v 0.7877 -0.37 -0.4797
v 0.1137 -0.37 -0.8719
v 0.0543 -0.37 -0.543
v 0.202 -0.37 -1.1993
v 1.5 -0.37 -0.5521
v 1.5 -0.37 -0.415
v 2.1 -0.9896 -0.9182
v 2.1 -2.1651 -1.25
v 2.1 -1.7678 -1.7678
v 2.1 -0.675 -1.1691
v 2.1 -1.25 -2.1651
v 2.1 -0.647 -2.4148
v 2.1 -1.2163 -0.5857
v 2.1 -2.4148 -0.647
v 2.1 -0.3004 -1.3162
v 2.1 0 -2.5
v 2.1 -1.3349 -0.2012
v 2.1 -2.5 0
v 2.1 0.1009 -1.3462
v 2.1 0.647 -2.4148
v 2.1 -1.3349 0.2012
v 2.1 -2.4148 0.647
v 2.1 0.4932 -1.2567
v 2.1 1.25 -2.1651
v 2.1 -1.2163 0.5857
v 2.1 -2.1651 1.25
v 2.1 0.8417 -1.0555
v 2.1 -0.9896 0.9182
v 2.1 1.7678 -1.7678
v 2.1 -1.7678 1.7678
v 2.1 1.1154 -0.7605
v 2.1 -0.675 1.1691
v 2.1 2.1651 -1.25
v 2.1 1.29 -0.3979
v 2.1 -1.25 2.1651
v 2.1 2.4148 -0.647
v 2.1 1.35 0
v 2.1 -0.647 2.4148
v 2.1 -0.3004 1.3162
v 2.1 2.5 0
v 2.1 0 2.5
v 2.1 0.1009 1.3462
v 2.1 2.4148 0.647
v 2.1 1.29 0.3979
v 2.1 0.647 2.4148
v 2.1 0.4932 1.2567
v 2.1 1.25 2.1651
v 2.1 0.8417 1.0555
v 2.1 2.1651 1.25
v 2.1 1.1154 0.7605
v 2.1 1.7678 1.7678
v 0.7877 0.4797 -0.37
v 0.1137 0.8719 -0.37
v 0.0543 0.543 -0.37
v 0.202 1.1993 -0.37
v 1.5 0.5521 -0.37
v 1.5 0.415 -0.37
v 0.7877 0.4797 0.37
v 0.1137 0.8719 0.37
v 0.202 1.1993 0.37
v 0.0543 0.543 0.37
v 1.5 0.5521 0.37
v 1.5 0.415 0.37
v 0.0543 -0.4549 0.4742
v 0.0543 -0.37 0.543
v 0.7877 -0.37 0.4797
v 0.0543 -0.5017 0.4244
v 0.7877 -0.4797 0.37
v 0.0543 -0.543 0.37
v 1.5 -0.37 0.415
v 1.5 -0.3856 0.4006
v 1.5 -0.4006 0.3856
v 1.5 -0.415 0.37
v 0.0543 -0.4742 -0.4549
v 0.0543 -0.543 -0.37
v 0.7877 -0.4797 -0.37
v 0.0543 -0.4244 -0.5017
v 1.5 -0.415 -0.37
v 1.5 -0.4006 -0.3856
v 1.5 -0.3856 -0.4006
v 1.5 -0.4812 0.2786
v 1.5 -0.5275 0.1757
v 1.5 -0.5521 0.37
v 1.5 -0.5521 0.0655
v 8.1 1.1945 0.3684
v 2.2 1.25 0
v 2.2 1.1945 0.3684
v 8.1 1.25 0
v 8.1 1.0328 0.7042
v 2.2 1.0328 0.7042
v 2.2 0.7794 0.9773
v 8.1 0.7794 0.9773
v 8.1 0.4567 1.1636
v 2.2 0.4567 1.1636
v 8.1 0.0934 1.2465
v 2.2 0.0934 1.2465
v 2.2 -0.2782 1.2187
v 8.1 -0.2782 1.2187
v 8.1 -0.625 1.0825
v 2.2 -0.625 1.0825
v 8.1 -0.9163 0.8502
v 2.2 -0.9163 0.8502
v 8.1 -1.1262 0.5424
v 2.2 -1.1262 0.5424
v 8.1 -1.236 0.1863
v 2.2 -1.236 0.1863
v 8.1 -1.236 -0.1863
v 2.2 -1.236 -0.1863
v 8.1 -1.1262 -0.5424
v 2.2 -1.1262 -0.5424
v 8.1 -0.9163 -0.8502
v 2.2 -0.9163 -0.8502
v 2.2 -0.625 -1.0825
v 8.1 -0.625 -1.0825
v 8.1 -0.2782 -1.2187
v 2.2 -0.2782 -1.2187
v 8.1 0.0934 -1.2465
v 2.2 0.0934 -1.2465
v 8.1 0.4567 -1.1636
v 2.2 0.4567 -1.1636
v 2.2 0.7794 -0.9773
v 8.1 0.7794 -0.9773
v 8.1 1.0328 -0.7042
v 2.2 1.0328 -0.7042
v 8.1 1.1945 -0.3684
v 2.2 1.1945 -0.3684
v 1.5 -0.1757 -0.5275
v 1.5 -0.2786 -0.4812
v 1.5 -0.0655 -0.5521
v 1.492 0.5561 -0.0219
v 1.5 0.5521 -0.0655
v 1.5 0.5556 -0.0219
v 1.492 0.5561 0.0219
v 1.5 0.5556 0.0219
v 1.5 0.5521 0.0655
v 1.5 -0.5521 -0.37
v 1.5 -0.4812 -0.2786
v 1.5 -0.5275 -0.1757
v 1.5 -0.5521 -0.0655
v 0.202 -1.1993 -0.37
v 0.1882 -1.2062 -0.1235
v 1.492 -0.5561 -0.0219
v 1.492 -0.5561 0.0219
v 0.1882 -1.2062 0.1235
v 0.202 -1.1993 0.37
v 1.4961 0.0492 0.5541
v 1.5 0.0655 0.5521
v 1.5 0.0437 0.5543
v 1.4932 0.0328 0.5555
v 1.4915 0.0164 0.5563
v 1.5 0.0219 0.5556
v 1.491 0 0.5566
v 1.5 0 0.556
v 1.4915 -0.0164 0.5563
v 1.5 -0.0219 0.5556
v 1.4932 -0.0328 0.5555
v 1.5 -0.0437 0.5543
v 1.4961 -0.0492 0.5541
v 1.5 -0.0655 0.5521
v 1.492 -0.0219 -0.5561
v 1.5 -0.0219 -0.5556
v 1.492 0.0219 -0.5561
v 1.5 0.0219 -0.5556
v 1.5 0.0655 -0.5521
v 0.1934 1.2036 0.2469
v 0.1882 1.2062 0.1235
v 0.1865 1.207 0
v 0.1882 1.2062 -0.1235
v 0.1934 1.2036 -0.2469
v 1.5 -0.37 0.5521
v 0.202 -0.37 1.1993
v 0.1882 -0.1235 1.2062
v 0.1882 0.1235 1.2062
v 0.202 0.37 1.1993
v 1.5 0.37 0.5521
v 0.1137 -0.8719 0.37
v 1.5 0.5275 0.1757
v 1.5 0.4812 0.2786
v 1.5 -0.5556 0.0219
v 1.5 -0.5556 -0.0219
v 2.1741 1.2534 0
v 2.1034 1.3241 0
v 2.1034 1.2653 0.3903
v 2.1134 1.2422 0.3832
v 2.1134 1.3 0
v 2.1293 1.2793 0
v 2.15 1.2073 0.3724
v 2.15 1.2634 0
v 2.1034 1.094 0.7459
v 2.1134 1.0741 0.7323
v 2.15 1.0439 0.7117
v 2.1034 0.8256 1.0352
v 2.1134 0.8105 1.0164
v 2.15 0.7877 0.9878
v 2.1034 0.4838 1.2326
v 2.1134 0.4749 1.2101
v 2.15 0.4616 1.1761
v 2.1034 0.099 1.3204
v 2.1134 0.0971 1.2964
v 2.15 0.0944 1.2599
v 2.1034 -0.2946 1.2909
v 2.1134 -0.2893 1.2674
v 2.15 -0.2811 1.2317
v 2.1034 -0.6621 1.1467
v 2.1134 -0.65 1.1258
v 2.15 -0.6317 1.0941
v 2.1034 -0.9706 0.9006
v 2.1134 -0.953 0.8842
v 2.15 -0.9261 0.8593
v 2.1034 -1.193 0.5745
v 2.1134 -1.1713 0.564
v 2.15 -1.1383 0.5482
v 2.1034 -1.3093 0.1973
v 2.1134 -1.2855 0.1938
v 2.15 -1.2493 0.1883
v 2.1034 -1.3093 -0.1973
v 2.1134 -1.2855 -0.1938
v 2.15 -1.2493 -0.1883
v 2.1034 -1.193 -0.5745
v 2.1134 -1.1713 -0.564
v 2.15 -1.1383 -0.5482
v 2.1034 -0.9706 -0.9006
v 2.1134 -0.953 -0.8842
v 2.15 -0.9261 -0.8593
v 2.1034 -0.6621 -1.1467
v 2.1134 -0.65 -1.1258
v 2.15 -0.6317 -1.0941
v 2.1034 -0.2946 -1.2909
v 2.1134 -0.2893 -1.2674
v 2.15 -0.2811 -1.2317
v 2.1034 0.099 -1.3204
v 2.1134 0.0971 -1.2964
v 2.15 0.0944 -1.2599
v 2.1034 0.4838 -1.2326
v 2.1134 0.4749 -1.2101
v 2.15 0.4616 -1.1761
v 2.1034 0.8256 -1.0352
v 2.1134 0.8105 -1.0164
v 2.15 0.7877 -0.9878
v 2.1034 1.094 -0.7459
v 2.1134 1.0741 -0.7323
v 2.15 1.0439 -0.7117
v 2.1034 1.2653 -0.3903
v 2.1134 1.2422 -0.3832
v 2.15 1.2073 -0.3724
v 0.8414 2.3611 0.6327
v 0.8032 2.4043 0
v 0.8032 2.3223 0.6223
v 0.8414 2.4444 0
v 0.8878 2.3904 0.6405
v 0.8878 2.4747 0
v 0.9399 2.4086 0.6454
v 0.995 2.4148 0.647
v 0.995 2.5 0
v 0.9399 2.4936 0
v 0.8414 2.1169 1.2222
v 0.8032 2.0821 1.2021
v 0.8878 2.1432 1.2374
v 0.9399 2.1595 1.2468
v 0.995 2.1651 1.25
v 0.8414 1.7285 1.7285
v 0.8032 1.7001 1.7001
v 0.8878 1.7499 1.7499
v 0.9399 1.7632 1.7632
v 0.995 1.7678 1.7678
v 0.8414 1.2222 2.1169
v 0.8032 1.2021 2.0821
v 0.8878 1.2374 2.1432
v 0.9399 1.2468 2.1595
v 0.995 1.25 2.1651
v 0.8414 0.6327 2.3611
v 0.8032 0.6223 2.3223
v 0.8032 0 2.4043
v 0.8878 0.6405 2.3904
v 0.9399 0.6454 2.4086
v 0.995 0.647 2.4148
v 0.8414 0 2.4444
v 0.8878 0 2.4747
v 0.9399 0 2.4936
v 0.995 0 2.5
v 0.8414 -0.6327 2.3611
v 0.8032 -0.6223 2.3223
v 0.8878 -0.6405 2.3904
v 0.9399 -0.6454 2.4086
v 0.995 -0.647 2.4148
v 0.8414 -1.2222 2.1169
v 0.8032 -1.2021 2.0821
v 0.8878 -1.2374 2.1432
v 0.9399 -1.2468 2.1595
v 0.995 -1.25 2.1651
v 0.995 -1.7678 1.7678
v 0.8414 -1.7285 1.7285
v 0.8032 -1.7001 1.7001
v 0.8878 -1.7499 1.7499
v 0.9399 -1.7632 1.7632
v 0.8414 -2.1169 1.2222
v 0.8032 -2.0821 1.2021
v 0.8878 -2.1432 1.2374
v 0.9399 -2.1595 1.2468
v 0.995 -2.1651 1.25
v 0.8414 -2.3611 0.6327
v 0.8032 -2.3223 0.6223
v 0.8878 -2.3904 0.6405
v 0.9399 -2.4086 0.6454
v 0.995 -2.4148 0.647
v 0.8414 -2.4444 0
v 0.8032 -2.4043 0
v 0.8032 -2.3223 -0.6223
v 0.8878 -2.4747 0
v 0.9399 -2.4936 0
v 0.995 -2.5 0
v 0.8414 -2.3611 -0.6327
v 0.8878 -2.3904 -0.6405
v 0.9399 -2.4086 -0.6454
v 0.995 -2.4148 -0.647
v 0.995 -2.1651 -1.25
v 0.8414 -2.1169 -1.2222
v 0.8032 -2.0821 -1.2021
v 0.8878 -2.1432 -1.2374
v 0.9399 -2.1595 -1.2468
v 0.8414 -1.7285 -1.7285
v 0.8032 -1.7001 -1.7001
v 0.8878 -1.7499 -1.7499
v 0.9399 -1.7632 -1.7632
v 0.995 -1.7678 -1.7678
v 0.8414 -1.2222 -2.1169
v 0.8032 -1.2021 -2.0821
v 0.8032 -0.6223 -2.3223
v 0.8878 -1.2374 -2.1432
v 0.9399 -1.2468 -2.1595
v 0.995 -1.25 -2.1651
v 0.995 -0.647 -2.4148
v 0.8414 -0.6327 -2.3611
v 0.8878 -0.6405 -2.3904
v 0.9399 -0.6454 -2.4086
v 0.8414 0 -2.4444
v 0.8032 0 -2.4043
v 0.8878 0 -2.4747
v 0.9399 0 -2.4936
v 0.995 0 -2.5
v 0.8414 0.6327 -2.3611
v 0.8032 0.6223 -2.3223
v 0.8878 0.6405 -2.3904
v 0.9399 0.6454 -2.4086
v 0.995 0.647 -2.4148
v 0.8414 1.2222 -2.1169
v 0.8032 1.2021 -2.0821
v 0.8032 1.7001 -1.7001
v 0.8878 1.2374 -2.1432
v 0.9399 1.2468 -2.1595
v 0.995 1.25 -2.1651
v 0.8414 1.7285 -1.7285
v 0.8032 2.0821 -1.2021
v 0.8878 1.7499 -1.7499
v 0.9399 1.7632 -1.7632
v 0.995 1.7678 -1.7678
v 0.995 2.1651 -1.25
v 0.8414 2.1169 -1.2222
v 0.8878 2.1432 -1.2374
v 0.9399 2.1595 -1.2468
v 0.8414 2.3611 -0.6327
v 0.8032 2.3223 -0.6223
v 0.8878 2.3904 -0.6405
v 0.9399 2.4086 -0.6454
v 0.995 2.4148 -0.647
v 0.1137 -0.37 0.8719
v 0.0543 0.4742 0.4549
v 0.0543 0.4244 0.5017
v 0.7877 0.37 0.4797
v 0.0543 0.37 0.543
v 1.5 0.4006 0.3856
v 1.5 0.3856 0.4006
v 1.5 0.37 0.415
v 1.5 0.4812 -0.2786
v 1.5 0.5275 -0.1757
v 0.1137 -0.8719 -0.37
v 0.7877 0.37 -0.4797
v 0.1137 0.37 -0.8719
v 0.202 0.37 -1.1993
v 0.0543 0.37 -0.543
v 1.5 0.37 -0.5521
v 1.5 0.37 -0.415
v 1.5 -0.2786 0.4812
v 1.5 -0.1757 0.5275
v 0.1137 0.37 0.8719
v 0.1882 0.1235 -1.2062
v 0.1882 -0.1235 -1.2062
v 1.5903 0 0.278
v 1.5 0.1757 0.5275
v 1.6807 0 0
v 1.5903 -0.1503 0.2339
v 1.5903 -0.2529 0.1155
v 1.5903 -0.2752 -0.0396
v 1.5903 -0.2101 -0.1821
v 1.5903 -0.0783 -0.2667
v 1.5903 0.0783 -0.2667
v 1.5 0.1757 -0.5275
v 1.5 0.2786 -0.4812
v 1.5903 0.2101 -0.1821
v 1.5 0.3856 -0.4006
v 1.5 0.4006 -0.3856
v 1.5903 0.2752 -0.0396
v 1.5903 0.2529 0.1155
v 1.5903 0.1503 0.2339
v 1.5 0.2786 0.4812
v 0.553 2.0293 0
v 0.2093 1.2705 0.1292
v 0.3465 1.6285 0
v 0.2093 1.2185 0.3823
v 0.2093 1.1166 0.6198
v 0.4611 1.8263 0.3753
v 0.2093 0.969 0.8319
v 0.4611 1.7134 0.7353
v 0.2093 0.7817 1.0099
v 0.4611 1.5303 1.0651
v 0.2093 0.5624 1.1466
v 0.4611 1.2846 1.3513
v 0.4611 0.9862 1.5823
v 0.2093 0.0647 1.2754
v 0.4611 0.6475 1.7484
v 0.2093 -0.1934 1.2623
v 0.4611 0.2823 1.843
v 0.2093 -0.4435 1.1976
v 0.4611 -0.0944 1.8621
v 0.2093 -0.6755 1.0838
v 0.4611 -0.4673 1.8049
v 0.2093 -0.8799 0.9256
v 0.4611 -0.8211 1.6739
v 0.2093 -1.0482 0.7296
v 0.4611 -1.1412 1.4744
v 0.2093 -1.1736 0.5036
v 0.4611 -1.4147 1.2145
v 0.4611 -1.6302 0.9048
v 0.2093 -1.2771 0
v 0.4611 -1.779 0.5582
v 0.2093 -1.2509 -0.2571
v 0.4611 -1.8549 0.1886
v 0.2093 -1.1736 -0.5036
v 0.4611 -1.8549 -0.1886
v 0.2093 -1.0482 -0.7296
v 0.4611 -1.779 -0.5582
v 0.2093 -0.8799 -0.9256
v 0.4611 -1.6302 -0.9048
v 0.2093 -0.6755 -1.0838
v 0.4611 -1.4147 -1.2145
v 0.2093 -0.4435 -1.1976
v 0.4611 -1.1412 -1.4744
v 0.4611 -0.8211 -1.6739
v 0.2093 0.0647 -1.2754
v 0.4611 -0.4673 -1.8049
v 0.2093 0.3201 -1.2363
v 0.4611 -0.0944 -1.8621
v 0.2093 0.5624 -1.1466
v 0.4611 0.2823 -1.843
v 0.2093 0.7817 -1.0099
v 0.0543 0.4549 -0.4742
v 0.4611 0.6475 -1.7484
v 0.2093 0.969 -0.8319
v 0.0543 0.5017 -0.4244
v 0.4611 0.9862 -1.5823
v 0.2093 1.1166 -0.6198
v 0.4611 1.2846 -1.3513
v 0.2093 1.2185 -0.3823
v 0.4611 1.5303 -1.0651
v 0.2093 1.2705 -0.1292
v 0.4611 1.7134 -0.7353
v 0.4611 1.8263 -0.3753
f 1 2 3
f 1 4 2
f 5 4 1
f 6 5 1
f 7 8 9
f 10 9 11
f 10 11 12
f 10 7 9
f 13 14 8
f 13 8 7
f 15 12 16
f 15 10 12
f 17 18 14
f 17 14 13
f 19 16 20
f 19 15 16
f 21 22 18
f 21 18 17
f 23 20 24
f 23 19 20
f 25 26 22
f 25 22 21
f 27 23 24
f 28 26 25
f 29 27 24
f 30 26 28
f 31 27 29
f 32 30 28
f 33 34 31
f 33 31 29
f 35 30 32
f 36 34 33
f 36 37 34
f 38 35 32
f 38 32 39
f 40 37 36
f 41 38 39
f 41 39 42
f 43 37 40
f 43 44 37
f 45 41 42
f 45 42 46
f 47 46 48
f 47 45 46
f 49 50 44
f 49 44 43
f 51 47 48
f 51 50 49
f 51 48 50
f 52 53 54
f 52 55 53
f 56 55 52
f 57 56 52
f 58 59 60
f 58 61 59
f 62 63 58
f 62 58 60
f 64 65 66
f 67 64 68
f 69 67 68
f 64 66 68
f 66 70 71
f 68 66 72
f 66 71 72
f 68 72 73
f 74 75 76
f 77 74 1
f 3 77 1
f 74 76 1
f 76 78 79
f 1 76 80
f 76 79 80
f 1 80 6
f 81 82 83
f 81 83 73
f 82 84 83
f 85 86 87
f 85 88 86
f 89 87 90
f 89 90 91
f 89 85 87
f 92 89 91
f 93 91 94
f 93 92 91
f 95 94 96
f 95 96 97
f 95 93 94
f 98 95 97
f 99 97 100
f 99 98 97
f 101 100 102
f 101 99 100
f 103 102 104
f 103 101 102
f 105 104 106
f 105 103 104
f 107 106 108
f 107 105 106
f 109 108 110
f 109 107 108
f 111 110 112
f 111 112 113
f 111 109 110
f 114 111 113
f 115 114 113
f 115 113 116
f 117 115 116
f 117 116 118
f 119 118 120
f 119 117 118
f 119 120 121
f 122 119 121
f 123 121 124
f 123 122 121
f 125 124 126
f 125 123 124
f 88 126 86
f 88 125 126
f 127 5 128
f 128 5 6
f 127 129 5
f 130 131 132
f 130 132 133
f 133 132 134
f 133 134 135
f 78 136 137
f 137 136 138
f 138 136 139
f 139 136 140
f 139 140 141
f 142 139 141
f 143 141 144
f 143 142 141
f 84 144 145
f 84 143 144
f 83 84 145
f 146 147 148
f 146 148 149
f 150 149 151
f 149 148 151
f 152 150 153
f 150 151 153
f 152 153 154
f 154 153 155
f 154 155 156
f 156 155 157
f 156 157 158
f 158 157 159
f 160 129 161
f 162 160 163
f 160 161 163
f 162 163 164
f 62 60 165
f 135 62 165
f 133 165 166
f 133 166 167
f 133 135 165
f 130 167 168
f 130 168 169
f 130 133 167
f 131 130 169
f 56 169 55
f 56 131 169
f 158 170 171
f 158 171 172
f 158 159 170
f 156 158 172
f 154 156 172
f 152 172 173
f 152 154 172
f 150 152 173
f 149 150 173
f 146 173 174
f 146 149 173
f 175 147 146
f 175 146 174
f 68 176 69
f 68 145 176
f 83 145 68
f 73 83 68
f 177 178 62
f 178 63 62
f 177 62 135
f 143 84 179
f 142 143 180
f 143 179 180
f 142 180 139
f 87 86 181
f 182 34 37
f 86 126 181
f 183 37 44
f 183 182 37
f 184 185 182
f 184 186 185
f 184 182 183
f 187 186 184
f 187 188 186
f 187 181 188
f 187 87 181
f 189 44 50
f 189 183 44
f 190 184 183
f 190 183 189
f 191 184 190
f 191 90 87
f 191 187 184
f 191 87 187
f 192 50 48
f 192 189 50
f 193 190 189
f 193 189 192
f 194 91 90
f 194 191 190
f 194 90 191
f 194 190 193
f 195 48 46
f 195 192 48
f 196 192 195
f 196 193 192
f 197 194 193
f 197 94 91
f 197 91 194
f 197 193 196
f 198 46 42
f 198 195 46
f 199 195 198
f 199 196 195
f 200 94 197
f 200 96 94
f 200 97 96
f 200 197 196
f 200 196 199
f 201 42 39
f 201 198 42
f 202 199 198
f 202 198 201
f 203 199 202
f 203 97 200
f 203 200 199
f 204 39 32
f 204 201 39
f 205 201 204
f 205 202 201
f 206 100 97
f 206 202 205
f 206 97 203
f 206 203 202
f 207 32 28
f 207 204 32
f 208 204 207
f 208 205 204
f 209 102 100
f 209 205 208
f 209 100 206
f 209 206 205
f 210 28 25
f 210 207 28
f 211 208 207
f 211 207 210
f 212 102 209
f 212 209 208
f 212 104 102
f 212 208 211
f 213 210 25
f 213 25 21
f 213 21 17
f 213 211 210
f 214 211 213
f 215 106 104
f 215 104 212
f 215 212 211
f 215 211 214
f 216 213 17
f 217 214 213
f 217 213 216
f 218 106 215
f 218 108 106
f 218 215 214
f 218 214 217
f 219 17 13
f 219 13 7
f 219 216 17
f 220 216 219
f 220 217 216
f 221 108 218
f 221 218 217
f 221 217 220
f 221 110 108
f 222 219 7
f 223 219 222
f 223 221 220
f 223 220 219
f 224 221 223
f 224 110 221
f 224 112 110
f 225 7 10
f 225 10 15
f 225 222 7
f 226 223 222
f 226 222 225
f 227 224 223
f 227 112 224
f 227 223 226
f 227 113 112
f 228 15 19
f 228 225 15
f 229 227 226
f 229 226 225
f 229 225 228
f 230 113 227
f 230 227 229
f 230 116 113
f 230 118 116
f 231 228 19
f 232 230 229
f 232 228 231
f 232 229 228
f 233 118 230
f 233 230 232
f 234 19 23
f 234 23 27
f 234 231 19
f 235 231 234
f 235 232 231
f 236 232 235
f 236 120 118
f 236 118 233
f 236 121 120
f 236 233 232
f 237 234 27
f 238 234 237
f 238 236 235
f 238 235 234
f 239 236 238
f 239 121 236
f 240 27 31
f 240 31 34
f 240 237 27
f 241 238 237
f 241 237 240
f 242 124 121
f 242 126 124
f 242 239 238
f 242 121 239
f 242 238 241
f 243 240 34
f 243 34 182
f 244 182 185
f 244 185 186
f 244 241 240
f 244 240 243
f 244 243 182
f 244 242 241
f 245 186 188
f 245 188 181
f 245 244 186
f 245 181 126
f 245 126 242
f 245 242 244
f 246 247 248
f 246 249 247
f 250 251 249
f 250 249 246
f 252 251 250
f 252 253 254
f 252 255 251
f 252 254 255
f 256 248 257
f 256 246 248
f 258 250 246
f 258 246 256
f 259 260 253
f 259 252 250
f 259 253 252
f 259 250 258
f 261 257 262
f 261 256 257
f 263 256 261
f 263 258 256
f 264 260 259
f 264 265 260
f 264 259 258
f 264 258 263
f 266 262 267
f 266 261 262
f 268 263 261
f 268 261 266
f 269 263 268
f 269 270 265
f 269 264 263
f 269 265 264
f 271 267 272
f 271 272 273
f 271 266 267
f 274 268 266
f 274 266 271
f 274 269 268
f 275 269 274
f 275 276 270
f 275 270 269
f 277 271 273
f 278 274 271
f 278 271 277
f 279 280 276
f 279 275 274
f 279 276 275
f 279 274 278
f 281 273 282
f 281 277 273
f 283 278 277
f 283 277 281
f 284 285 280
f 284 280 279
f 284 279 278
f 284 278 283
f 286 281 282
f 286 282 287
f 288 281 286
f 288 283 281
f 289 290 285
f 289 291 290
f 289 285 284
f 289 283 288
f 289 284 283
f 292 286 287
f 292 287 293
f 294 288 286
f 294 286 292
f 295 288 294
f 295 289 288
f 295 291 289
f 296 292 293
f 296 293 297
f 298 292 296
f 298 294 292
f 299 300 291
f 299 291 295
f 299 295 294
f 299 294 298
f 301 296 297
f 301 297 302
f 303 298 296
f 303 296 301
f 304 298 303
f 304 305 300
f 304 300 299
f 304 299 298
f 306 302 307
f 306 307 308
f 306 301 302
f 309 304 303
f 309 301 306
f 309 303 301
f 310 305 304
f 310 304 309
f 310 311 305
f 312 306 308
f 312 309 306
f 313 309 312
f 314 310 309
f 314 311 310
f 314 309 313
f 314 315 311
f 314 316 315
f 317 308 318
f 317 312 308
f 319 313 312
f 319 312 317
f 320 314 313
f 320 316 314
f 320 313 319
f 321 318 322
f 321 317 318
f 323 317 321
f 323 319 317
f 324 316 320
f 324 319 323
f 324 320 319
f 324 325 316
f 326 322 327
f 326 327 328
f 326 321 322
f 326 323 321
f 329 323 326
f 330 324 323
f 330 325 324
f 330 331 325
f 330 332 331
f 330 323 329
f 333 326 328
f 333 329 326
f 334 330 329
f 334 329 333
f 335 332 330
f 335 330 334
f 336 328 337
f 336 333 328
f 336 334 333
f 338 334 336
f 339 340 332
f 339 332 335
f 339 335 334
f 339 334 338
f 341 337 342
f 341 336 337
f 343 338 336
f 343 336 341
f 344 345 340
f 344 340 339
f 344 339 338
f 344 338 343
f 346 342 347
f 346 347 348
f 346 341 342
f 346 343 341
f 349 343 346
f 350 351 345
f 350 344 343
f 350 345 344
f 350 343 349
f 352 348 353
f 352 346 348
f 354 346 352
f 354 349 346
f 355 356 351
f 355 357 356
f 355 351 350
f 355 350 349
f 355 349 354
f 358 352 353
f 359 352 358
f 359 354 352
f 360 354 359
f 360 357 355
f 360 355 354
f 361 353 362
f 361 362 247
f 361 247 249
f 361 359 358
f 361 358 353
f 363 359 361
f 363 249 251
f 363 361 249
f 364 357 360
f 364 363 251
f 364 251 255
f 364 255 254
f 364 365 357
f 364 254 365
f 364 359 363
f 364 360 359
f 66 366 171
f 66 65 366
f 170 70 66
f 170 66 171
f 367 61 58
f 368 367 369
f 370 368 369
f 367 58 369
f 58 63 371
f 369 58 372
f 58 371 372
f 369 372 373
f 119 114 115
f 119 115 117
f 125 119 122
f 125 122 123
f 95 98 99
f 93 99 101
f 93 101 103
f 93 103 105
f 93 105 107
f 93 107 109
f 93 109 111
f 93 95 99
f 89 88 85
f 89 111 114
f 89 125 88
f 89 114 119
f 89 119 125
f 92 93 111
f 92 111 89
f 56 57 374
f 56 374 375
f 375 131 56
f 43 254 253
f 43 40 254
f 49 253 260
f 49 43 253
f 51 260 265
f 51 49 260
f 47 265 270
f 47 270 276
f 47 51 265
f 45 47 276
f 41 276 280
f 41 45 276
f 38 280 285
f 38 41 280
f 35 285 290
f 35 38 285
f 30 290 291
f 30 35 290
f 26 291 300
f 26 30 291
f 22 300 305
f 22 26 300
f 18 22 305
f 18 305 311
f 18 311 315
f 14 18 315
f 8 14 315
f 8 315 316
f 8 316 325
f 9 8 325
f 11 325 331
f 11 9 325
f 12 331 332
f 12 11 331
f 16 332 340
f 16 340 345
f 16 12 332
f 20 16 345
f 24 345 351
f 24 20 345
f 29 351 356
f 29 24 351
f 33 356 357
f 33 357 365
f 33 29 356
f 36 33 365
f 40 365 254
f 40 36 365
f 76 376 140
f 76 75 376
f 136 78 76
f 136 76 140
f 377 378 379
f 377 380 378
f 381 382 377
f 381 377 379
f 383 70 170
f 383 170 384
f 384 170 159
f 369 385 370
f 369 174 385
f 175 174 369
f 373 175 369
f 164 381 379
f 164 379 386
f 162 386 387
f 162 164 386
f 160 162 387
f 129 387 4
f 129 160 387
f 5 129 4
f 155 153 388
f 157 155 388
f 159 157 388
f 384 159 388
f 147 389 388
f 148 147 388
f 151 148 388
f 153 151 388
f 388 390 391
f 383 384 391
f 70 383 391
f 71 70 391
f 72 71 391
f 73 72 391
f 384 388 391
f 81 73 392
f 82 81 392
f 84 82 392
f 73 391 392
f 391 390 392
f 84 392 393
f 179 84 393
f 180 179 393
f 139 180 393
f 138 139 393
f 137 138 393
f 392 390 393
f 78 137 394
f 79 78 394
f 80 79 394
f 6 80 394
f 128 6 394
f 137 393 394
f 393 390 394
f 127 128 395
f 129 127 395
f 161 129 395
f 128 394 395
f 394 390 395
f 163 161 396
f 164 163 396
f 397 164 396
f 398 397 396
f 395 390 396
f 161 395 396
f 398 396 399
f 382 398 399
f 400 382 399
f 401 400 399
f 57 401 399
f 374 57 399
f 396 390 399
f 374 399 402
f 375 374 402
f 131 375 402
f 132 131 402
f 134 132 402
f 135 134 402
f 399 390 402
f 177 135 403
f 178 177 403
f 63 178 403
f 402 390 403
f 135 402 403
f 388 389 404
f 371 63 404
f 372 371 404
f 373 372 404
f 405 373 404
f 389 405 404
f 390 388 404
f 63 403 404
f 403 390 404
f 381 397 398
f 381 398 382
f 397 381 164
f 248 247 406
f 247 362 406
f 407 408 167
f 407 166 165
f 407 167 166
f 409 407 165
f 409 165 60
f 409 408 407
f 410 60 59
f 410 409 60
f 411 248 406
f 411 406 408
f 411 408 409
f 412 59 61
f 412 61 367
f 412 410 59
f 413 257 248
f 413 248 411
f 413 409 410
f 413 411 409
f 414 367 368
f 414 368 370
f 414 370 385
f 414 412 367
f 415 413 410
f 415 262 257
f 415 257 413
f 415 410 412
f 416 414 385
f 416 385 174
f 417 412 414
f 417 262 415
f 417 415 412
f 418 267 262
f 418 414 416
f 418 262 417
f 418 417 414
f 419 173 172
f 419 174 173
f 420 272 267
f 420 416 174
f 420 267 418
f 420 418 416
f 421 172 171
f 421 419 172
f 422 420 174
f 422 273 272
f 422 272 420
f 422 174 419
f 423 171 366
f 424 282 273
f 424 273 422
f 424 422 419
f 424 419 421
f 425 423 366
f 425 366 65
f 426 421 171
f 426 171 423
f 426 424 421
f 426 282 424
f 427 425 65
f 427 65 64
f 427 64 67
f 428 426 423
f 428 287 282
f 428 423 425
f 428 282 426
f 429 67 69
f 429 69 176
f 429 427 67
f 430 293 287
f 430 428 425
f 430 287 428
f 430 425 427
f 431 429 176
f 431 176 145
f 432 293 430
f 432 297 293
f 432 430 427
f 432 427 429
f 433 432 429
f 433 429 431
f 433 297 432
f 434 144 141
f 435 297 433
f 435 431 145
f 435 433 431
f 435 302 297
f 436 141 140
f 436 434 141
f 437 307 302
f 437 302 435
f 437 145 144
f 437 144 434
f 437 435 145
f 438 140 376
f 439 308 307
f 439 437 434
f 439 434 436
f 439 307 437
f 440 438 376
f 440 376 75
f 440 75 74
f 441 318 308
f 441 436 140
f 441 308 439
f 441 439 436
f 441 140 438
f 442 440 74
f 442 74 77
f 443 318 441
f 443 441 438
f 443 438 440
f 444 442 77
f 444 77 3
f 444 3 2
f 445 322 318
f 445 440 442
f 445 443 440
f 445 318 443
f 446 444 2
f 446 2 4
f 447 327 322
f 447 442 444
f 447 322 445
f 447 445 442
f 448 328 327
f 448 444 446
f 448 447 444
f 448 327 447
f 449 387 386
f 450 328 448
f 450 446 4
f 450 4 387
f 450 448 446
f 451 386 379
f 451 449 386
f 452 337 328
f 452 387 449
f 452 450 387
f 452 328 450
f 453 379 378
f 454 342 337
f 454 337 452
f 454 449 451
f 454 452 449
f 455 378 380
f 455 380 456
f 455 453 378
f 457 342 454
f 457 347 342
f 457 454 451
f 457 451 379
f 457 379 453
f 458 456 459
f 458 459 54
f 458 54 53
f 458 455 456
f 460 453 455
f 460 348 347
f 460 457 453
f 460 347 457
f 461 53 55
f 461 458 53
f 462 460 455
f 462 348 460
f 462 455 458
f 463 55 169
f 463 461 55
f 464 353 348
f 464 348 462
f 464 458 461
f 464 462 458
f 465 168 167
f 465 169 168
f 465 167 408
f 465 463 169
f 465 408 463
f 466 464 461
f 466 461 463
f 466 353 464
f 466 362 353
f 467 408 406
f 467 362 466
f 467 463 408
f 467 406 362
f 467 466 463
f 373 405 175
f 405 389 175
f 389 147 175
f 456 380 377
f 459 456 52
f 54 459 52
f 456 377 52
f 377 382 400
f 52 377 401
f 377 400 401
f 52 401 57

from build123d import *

# Parameters (mm, degrees)
RECPAT_COUNT = 2
RECPAT_ANGLE = 90


with BuildPart() as part:
    # Fillet1: read off the stored shape, not the designer's step
    # Fillet1 outline → Fillet1 (revolve)
    with BuildSketch(Plane.YX):
        with BuildLine():
            Line((1.25, 2.2), (1.25, 8.1))
            Line((1.25, 8.1), (0, 8.1))
            Line((0, 8.1), (0, 0))
            ThreePointArc((0, 0), (1.267435139, 0.206109099), (2.404255321, 0.803195916))
            ThreePointArc((2.404255321, 0.803195916), (2.474733878, 0.88781572), (2.5, 0.99500416))
            Line((2.5, 0.99500416), (2.5, 2.1))
            Line((2.5, 2.1), (1.35, 2.1))
            ThreePointArc((1.35, 2.1), (1.279289322, 2.129289322), (1.25, 2.2))
        make_face()
    revolve(axis=Axis((0, 0, 0), (1, 0, 0)))

    # Sketch3 → Recess section 0
    with BuildSketch(Plane(origin=(0, 0, 0), x_dir=(0, 0, -1), z_dir=(1, 0, 0))):
        with BuildLine():
            Line((0.37, -1.3), (-0.37, -1.3))
            Line((-0.37, -1.3), (-0.37, 1.3))
            Line((-0.37, 1.3), (0.37, 1.3))
            Line((0.37, 1.3), (0.37, -1.3))
        make_face()
    # Sketch4 → Recess section 1
    with BuildSketch(Plane(origin=(1.5, 0, 0), x_dir=(0, 0, -1), z_dir=(1, 0, 0))):
        with BuildLine():
            Line((0.37, -0.552127713), (-0.37, -0.552127713))
            Line((-0.37, -0.552127713), (-0.37, 0.552127713))
            Line((-0.37, 0.552127713), (0.37, 0.552127713))
            Line((0.37, 0.552127713), (0.37, -0.552127713))
        make_face()
    recess = loft(mode=Mode.SUBTRACT)

    # RecPat: Recess ×2 about axis
    recpat_axis = Axis((0, 0, 0), (1, 0, 0))
    for i in range(1, RECPAT_COUNT):
        add(recess.rotate(recpat_axis, i * RECPAT_ANGLE / (RECPAT_COUNT - 1)), mode=Mode.SUBTRACT)

    # RecCorSke → RecessCore (revolve, cut)
    with BuildSketch(Plane.XY, mode=Mode.PRIVATE) as recesscore_sk:
        Polygon((0, 0), (0, 0.660890218), (1.5, 0.556), (1.680655351, 0), align=None)
    revolve(recesscore_sk.sketch.rotate(Axis((-3.175, 0, 0), (1, 0, 0)), 90), axis=Axis((-3.175, 0, 0), (1, 0, 0)), mode=Mode.SUBTRACT)


solid = part.part
